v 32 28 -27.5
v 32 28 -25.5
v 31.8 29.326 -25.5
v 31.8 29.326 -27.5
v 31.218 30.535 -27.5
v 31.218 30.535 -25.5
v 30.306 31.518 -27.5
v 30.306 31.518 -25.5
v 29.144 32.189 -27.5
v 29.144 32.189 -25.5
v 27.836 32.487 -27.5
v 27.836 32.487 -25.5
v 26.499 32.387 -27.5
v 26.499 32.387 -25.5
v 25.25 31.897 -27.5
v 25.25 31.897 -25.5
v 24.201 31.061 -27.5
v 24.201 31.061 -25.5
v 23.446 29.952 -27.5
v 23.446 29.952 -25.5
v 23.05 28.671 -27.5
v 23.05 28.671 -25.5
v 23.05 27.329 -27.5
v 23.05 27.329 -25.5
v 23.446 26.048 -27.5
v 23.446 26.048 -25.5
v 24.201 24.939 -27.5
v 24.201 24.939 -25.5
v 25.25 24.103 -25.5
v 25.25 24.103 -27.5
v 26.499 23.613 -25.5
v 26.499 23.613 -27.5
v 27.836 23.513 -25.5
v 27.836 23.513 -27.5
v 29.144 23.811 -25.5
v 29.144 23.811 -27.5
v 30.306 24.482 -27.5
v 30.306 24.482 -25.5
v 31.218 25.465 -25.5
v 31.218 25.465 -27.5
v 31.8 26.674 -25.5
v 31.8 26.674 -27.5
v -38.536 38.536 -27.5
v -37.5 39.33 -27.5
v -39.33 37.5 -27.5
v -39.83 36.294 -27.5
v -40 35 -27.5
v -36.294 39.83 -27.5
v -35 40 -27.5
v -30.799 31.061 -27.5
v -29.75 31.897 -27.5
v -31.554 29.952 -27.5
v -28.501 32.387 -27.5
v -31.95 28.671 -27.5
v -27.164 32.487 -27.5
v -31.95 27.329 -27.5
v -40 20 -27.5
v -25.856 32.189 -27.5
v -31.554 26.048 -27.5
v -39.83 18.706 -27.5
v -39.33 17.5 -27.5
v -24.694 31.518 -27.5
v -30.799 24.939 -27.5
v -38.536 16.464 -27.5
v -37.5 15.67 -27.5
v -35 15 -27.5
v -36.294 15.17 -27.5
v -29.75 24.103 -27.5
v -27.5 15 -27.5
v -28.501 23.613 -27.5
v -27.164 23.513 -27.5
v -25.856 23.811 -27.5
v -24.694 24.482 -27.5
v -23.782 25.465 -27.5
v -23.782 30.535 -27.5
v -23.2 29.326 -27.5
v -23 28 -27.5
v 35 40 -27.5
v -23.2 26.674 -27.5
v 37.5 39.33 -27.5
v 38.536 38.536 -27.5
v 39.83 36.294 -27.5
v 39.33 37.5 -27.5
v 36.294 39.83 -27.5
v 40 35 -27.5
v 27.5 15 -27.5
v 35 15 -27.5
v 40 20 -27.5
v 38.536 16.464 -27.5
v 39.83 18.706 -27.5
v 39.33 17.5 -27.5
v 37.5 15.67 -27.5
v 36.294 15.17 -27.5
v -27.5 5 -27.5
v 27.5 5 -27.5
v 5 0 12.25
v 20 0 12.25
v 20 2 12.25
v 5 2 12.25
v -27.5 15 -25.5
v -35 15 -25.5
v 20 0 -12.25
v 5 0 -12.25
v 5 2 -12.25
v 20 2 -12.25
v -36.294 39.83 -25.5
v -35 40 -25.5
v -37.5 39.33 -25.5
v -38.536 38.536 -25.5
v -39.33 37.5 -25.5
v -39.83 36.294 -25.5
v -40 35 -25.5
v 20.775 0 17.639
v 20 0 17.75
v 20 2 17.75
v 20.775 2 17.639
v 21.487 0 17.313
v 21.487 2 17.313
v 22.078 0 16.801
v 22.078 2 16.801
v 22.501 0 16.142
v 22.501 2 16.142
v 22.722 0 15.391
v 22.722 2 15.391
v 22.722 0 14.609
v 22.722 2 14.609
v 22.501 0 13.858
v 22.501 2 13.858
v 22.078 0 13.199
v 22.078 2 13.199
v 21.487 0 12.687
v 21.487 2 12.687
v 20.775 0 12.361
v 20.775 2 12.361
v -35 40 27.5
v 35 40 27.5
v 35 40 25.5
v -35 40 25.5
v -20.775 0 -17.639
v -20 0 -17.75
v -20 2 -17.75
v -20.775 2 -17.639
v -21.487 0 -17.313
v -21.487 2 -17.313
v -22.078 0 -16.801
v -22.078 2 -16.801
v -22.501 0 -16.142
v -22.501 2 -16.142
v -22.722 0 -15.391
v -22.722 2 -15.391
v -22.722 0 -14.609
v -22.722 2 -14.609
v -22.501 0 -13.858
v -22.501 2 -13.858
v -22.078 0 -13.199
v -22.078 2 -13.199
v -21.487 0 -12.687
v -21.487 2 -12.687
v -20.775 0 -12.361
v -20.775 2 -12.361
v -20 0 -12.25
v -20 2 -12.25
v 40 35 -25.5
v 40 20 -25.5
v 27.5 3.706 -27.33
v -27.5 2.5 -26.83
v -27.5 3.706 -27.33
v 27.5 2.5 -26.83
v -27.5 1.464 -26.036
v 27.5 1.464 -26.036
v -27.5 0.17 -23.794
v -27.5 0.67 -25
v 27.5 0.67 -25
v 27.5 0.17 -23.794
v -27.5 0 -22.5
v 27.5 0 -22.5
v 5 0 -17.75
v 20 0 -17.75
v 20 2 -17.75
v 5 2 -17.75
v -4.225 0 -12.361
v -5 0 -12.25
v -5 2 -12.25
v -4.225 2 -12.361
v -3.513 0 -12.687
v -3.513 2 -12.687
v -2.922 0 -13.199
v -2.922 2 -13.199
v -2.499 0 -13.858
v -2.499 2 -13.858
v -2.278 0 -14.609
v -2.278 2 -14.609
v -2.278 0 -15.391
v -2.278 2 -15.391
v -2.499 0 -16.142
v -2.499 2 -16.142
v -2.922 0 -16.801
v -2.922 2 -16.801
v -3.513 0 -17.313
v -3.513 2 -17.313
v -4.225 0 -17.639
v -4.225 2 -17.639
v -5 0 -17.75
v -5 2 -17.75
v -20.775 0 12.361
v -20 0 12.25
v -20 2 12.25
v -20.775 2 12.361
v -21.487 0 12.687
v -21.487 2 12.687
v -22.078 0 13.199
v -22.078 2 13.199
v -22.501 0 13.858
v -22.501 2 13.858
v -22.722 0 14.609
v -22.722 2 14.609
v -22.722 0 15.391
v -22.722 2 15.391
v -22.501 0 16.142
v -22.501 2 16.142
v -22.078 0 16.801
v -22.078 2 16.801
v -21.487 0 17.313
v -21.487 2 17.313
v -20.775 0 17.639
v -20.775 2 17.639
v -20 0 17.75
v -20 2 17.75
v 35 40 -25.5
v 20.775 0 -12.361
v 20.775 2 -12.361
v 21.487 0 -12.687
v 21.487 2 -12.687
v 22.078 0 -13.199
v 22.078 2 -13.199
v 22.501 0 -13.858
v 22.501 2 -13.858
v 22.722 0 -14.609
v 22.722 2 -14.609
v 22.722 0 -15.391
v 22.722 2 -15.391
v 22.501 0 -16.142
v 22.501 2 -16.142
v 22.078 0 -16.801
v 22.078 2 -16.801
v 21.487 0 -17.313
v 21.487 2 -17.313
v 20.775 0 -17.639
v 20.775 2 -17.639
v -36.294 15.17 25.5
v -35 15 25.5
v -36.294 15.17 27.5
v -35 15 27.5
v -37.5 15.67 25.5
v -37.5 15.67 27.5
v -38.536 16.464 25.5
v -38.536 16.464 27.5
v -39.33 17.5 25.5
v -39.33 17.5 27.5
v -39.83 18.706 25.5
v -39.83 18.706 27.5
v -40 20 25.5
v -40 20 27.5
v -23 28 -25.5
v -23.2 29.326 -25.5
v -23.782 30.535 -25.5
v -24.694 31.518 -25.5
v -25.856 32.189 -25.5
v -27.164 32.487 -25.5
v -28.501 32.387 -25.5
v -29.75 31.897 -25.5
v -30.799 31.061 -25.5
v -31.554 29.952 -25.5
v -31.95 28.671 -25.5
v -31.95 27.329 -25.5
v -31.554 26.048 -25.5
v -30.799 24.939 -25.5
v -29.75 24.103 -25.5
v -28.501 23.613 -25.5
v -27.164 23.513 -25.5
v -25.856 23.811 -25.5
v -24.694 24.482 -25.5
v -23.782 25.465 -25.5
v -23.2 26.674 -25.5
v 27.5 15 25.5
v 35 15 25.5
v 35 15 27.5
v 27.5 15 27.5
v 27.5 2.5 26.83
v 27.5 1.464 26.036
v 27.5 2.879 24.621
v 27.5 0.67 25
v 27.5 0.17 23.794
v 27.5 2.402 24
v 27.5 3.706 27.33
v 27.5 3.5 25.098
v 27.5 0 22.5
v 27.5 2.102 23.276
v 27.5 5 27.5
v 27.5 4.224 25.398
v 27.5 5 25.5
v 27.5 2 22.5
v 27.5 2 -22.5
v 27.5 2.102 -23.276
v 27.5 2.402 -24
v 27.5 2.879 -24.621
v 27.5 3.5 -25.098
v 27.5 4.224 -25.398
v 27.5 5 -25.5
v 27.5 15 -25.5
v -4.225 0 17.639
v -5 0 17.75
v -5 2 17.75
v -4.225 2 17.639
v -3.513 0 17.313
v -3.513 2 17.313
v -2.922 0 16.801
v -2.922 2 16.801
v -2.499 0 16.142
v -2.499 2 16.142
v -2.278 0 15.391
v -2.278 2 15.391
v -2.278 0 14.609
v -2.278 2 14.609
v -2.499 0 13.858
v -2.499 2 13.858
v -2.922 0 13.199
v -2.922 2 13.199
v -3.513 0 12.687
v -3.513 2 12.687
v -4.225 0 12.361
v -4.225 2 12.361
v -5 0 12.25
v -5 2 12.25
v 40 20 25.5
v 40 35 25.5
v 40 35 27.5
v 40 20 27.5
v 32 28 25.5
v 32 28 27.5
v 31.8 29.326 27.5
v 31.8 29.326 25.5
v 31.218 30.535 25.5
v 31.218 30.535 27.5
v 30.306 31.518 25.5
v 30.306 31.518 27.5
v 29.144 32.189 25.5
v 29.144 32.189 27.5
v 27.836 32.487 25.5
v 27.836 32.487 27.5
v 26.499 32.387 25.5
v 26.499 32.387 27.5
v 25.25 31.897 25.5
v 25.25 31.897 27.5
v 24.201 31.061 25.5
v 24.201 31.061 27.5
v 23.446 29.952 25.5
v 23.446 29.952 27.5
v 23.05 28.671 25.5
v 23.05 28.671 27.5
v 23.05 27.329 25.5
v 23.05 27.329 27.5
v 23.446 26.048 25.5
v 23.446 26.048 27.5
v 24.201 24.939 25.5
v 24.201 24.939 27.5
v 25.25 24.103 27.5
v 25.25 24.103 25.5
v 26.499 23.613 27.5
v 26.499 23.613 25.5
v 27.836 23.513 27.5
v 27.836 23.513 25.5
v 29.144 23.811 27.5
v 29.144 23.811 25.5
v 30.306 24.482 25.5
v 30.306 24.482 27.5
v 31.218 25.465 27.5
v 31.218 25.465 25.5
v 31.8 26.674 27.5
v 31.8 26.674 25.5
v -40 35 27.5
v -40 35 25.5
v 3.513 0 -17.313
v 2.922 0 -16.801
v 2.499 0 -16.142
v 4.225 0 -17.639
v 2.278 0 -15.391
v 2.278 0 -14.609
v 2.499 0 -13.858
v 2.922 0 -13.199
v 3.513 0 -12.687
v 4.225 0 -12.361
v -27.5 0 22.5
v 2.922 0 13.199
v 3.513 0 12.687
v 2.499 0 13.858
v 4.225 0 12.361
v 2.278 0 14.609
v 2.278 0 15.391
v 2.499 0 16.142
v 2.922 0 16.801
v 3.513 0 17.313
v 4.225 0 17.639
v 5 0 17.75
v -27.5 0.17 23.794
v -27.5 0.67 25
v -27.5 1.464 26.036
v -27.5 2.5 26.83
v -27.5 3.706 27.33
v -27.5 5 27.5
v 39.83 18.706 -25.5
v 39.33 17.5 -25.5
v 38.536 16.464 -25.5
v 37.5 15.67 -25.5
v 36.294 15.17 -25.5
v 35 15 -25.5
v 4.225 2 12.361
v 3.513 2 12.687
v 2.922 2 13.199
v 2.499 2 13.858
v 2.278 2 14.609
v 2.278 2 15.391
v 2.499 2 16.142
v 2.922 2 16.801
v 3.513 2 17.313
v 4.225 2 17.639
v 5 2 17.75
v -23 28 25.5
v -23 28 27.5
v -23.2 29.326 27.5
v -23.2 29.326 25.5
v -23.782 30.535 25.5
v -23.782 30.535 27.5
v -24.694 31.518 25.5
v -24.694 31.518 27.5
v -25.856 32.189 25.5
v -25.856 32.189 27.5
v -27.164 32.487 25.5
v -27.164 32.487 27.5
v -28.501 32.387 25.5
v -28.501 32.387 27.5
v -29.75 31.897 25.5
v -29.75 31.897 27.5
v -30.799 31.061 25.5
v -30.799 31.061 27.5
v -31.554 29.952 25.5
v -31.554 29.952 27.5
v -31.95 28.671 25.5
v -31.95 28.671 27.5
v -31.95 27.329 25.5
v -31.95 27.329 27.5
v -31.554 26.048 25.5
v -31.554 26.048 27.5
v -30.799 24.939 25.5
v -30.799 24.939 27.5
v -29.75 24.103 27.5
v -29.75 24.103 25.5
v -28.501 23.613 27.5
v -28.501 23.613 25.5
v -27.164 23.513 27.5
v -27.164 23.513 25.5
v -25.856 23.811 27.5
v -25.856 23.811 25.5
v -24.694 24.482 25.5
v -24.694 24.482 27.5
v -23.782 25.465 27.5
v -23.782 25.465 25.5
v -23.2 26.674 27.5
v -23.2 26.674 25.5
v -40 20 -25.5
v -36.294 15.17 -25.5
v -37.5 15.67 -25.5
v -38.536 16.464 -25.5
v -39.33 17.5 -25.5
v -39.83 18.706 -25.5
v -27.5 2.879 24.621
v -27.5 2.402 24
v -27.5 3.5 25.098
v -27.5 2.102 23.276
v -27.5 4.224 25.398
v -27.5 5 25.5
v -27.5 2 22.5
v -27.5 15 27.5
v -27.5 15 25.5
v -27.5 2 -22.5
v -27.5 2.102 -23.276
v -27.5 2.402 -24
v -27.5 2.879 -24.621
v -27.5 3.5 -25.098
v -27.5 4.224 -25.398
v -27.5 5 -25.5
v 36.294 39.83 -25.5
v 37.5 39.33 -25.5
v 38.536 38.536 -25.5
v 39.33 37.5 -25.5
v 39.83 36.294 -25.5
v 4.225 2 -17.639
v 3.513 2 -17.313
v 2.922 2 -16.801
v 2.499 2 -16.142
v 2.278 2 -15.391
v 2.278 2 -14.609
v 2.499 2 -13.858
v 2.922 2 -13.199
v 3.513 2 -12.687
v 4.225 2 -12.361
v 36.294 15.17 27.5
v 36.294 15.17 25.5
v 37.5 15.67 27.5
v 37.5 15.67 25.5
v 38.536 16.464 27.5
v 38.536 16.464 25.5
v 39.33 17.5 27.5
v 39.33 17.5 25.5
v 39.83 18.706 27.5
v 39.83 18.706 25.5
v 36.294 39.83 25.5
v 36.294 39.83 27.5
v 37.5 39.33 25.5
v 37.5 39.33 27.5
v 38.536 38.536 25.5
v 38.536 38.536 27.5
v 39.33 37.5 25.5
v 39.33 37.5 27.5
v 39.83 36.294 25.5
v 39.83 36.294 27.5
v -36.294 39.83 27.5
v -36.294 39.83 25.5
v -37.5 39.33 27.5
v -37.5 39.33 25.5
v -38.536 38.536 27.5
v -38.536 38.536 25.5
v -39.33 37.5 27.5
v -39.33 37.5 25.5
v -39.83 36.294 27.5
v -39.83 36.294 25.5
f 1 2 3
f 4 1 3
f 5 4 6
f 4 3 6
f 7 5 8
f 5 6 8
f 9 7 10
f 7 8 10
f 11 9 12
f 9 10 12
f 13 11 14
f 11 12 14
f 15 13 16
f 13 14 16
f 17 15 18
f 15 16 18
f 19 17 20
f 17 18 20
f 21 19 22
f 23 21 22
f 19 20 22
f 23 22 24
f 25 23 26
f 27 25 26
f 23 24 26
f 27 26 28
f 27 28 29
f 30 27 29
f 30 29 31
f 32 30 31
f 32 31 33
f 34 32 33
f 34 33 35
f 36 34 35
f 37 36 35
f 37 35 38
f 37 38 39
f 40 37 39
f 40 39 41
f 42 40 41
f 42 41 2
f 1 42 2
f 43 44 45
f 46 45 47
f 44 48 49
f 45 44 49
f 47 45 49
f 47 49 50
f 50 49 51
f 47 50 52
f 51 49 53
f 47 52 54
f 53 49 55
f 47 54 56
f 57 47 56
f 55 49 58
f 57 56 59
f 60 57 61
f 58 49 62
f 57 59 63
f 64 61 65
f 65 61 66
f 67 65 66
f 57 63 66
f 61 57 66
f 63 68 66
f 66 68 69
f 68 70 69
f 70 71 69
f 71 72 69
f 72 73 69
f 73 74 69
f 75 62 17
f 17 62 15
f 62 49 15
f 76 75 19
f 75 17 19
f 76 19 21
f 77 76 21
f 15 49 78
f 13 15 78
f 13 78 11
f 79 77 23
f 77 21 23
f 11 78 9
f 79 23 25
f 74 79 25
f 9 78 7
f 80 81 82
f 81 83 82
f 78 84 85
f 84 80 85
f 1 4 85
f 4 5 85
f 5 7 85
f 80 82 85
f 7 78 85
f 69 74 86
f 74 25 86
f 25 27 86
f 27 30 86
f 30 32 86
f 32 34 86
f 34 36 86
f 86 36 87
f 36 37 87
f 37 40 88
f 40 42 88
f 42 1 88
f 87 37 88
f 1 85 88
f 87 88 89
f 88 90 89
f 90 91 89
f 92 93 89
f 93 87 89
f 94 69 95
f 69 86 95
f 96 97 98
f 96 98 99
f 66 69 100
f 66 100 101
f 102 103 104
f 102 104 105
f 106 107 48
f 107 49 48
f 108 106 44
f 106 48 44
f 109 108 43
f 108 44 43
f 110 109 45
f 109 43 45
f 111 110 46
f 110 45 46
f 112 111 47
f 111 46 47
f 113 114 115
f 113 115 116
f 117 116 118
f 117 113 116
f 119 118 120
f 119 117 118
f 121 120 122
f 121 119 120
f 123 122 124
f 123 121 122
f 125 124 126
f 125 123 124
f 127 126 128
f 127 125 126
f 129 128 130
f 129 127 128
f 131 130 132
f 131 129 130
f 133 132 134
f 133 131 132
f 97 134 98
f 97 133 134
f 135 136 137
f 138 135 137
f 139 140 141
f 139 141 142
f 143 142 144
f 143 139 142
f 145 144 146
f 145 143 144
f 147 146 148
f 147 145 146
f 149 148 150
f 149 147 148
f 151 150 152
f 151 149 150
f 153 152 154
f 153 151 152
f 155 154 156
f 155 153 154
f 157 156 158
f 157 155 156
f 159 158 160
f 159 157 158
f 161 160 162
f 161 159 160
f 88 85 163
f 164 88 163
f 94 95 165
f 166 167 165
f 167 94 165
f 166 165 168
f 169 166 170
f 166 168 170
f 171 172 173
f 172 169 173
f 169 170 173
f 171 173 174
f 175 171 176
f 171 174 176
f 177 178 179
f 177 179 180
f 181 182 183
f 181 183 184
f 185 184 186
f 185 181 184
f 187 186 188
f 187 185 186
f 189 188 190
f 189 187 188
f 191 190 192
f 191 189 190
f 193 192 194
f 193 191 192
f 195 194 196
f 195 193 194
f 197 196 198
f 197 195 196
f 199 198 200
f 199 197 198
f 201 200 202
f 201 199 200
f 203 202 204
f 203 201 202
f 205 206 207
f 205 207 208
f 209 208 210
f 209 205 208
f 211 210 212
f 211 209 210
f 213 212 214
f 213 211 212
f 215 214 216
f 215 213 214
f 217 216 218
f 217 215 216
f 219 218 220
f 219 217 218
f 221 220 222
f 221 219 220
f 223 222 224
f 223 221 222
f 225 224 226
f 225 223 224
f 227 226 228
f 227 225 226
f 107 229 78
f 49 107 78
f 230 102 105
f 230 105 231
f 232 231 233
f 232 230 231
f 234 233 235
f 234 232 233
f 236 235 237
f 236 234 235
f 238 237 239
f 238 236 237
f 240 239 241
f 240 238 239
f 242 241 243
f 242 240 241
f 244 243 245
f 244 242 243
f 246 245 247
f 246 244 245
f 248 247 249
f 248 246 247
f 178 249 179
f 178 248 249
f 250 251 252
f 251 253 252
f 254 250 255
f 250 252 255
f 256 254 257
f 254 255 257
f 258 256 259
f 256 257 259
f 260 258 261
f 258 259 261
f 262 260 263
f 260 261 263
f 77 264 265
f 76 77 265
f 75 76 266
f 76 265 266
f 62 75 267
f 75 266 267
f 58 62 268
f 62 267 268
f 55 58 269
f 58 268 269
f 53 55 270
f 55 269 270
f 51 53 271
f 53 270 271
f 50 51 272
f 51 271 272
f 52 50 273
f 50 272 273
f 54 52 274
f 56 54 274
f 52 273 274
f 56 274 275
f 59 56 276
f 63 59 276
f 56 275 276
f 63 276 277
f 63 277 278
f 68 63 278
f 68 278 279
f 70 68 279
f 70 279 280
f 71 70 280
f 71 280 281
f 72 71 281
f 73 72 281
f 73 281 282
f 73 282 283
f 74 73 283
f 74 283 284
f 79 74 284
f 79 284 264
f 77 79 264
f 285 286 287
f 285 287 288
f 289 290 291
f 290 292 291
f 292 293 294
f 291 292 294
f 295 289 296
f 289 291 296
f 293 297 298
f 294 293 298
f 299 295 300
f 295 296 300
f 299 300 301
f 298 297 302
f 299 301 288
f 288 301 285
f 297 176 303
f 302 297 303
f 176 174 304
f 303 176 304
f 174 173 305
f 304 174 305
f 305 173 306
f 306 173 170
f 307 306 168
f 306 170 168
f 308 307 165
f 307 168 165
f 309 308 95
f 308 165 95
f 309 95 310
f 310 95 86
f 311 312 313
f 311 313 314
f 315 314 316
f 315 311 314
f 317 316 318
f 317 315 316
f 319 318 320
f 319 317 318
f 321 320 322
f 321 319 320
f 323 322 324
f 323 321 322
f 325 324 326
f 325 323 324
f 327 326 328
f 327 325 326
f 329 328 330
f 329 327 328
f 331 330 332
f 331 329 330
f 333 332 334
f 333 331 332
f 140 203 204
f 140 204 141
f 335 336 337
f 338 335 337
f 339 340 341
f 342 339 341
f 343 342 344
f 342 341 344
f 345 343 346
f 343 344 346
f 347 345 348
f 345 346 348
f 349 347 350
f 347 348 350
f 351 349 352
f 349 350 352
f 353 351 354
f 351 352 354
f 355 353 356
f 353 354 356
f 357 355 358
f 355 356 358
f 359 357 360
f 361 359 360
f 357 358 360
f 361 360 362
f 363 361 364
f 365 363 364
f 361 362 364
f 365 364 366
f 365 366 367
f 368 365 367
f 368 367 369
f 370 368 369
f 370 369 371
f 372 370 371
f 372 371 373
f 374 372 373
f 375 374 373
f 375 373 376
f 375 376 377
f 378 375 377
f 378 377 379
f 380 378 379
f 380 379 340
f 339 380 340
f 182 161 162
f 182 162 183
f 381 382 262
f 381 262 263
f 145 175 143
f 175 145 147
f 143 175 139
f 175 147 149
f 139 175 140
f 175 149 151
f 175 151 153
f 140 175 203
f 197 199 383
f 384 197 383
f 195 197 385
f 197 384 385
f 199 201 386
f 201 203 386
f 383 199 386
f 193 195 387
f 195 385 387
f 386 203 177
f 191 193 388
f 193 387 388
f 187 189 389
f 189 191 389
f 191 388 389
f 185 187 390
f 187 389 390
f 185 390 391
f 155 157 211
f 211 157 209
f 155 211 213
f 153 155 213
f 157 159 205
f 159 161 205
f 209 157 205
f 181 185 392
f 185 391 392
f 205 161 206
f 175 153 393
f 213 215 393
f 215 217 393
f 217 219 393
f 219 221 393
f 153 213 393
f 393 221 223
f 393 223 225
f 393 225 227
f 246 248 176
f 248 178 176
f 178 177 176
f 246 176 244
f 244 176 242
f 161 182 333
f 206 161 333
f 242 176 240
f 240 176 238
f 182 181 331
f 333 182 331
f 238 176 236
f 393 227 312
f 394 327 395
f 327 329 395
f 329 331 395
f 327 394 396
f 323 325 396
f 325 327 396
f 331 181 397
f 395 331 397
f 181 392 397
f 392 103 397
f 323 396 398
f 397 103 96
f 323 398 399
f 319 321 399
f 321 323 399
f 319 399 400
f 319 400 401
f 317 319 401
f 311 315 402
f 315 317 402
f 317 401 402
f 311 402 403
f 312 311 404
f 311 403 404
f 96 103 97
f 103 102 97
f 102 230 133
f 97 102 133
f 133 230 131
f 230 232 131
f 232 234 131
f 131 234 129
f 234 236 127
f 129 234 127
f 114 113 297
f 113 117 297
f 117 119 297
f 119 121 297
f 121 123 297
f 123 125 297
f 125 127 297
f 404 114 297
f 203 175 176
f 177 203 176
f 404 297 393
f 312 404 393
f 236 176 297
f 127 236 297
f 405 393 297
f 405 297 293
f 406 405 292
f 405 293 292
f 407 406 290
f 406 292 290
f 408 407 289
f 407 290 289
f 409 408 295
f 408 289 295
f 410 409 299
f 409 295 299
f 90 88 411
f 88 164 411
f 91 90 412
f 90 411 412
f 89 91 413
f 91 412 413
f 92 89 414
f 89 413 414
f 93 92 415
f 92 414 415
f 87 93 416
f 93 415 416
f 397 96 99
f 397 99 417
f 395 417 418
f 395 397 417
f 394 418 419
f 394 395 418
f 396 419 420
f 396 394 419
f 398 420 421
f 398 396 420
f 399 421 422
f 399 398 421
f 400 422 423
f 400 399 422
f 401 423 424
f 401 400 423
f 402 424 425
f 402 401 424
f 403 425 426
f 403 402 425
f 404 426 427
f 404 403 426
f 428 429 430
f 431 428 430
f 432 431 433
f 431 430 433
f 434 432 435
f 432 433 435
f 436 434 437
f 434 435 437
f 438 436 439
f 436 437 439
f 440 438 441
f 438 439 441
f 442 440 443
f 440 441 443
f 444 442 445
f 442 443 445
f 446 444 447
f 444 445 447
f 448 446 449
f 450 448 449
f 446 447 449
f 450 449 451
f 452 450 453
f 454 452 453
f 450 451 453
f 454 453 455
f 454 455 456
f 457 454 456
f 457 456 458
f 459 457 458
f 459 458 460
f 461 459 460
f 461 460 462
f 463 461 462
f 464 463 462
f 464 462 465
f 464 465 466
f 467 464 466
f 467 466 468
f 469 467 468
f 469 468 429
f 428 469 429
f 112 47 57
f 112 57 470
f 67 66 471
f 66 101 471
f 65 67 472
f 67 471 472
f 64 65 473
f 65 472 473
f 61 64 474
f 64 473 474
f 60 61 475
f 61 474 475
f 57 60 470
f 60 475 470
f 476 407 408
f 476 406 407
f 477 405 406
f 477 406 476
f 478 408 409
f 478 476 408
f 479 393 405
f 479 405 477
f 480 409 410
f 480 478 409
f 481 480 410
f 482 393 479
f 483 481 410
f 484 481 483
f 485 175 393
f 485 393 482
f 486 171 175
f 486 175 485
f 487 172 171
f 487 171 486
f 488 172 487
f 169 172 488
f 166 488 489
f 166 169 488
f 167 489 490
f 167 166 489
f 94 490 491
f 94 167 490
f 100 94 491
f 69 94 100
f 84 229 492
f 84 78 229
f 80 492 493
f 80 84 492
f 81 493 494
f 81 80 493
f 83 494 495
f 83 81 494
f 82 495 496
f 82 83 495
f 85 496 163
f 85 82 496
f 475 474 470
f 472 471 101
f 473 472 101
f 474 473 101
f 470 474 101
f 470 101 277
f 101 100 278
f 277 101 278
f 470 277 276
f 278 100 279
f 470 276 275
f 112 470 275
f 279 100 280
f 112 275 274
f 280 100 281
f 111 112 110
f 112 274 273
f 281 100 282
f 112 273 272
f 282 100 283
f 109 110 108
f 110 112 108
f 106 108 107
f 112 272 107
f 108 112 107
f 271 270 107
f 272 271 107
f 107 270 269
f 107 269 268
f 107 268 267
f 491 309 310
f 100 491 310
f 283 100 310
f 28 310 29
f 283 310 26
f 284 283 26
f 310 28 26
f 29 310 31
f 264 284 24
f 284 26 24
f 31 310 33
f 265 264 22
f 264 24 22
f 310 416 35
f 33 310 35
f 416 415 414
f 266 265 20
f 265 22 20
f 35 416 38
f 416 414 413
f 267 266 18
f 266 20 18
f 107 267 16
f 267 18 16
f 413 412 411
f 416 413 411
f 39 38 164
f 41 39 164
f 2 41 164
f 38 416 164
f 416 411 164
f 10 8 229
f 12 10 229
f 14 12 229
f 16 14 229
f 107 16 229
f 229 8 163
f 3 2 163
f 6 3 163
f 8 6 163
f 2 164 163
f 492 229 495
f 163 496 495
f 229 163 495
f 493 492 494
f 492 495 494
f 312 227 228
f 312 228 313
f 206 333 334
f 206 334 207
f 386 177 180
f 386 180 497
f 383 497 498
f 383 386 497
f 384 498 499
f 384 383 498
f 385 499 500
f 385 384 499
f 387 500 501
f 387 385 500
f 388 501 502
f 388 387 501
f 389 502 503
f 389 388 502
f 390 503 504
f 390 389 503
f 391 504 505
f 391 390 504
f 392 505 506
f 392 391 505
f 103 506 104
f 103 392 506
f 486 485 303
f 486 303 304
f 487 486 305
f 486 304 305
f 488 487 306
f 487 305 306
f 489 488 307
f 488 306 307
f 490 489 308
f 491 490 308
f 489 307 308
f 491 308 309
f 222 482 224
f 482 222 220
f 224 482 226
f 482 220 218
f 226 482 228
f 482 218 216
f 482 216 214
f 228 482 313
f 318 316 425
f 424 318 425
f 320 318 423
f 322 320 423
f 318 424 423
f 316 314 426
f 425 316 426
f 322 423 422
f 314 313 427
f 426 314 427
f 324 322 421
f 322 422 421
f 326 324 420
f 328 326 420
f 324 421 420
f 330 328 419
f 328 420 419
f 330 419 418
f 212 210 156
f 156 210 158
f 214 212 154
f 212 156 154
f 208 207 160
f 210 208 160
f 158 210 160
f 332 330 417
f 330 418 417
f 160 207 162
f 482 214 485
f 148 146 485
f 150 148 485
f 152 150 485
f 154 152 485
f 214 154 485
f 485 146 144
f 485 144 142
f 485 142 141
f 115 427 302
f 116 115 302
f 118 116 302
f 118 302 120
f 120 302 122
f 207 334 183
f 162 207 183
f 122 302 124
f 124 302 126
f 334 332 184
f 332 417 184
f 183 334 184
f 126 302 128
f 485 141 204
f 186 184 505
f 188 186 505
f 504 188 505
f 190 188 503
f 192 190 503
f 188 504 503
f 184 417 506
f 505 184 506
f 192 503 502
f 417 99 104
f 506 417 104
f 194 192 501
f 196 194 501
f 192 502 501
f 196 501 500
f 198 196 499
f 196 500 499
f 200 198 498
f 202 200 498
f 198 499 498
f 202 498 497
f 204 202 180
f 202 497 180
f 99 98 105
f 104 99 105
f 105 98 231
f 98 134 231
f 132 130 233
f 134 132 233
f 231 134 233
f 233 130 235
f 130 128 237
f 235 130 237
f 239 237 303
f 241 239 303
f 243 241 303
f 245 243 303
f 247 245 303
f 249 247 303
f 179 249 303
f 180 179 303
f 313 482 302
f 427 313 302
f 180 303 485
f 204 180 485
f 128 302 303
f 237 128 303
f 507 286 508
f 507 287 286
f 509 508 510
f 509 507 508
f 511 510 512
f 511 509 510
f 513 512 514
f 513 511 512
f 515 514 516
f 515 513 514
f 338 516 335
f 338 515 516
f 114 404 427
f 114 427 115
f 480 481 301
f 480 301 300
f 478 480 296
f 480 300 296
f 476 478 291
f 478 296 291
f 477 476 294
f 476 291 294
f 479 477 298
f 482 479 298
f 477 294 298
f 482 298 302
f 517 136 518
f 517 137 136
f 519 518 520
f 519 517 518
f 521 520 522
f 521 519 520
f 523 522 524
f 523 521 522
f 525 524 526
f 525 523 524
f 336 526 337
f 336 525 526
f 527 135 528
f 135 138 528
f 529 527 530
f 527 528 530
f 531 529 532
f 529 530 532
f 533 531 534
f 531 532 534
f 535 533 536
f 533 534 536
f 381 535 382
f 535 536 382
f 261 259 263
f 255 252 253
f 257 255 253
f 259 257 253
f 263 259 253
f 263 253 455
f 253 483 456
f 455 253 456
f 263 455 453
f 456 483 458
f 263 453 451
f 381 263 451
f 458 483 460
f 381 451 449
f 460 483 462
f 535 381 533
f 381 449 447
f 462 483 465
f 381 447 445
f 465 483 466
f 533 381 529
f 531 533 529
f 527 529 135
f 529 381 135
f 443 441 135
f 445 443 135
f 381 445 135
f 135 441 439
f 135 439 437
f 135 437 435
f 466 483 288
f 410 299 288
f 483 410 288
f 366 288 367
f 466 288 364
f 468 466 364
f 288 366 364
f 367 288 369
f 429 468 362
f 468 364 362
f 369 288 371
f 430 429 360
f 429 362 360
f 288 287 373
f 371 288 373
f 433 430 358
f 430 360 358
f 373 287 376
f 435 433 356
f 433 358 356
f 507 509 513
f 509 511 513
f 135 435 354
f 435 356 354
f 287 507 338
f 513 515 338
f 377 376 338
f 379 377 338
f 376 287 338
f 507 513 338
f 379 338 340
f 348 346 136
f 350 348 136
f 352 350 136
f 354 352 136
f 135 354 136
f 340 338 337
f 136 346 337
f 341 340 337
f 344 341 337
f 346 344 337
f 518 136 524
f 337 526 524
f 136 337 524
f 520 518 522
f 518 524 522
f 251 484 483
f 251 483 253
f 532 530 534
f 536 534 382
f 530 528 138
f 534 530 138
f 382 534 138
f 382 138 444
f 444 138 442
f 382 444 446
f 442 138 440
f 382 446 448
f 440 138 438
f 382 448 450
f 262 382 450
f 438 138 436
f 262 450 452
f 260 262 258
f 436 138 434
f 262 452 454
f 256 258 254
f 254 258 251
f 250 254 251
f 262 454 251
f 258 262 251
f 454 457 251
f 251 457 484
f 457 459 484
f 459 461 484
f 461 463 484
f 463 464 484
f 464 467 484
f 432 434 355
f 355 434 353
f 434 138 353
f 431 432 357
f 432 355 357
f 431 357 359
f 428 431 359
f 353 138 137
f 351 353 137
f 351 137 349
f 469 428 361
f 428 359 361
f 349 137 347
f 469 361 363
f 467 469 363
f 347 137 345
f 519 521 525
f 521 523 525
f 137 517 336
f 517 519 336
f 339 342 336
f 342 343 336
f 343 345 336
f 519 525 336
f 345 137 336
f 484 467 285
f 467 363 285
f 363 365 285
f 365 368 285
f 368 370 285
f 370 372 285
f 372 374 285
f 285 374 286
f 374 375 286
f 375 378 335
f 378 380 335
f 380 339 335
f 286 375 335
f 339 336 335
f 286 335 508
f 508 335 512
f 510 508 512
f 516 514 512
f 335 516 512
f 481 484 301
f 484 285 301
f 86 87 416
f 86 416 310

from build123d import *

# Parameters (mm, degrees)
ODGI_CIE_BAZOWE1_DEPTH      = 40
SZCZELINA_POD_RUB_M52_DEPTH = 2
OTW_R_POD_RUB_M81_D         = 9
SZKIC10_W                   = 12.5
SZKIC10_H                   = 15
WYTNIJ_WYCI_GNI_CIE1_DEPTH  = 79.89866919
ZAOKR_GLENIE1_R             = 5


# Read off the part's stored shape, not the designer's step: Szczelina pod śrubę M52
# Sheet-metal steps are written as plain solids
with BuildPart() as part:
    # Szkic1 → Odgięcie bazowe1 (new, symmetric)
    with BuildSketch(Plane(origin=(0, 0, 0), x_dir=(0, 0, -1), z_dir=(1, 0, 0))):
        with BuildLine():
            Line((27.5, 40), (27.5, 5))
            ThreePointArc((27.5, 5), (26.035533906, 1.464466094), (22.5, 0))
            Line((22.5, 0), (-22.5, 0))
            ThreePointArc((-22.5, 0), (-26.035533906, 1.464466094), (-27.5, 5))
            Line((-27.5, 5), (-27.5, 40))
            Line((-27.5, 40), (-25.5, 40))
            Line((-25.5, 40), (-25.5, 5))
            ThreePointArc((-25.5, 5), (-24.621320344, 2.878679656), (-22.5, 2))
            Line((-22.5, 2), (22.5, 2))
            ThreePointArc((22.5, 2), (24.621320344, 2.878679656), (25.5, 5))
            Line((25.5, 5), (25.5, 40))
            Line((25.5, 40), (27.5, 40))
        make_face()
    extrude(amount=ODGI_CIE_BAZOWE1_DEPTH, both=True)

    # Szczelina pod śrubę M52 outline → Szczelina pod śrubę M52 (cut)
    with BuildSketch(Plane(origin=(0, 0, 0), x_dir=(1, 0, 0), z_dir=(0, 1, 0))):
        with BuildLine():
            ThreePointArc((5, -12.25), (2.25, -15), (5, -17.75))
            Line((5, -17.75), (20, -17.75))
            ThreePointArc((20, -17.75), (22.75, -15), (20, -12.25))
            Line((20, -12.25), (5, -12.25))
        make_face()
        with BuildLine():
            ThreePointArc((-20, -12.25), (-22.75, -15), (-20, -17.75))
            Line((-20, -17.75), (-5, -17.75))
            ThreePointArc((-5, -17.75), (-2.25, -15), (-5, -12.25))
            Line((-5, -12.25), (-20, -12.25))
        make_face()
        with BuildLine():
            ThreePointArc((-5, 12.25), (-2.25, 15), (-5, 17.75))
            Line((-5, 17.75), (-20, 17.75))
            ThreePointArc((-20, 17.75), (-22.75, 15), (-20, 12.25))
            Line((-20, 12.25), (-5, 12.25))
        make_face()
        with BuildLine():
            ThreePointArc((20, 12.25), (22.75, 15), (20, 17.75))
            Line((20, 17.75), (5, 17.75))
            ThreePointArc((5, 17.75), (2.25, 15), (5, 12.25))
            Line((5, 12.25), (20, 12.25))
        make_face()
    extrude(amount=SZCZELINA_POD_RUB_M52_DEPTH, mode=Mode.SUBTRACT)

    # Otwór pod śrubę M81 (through all)
    with Locations(Plane(origin=(0, 0, -27.5), x_dir=(-1, 0, 0), z_dir=(0, 0, -1))):
        with Locations((-27.5, 28), (27.5, 28)):
            Hole(OTW_R_POD_RUB_M81_D / 2)

    # Szkic10 → Wytnij-wyciągnięcie1 (cut, through all)
    with BuildSketch(Plane(origin=(0, 0, -27.5), x_dir=(-1, 0, 0), z_dir=(0, 0, -1))):
        with Locations((-33.75, 7.5)):
            Rectangle(SZKIC10_W, SZKIC10_H)
        with Locations((33.75, 7.5)):
            Rectangle(SZKIC10_W, SZKIC10_H)
    extrude(amount=-WYTNIJ_WYCI_GNI_CIE1_DEPTH, mode=Mode.SUBTRACT)

    # Zaokrąglenie1
    zaokr_glenie1_edges = [part.edges().sort_by_distance(p)[0] for p in [
        (-40, 40, -26.5),
        (-40, 40, 26.5),
        (40, 15, -26.5),
        (40, 15, 26.5),
        (-40, 15, -26.5),
        (-40, 15, 26.5),
        (40, 40, -26.5),
        (40, 40, 26.5),
    ]]
    fillet(zaokr_glenie1_edges, radius=ZAOKR_GLENIE1_R)


solid = part.part
